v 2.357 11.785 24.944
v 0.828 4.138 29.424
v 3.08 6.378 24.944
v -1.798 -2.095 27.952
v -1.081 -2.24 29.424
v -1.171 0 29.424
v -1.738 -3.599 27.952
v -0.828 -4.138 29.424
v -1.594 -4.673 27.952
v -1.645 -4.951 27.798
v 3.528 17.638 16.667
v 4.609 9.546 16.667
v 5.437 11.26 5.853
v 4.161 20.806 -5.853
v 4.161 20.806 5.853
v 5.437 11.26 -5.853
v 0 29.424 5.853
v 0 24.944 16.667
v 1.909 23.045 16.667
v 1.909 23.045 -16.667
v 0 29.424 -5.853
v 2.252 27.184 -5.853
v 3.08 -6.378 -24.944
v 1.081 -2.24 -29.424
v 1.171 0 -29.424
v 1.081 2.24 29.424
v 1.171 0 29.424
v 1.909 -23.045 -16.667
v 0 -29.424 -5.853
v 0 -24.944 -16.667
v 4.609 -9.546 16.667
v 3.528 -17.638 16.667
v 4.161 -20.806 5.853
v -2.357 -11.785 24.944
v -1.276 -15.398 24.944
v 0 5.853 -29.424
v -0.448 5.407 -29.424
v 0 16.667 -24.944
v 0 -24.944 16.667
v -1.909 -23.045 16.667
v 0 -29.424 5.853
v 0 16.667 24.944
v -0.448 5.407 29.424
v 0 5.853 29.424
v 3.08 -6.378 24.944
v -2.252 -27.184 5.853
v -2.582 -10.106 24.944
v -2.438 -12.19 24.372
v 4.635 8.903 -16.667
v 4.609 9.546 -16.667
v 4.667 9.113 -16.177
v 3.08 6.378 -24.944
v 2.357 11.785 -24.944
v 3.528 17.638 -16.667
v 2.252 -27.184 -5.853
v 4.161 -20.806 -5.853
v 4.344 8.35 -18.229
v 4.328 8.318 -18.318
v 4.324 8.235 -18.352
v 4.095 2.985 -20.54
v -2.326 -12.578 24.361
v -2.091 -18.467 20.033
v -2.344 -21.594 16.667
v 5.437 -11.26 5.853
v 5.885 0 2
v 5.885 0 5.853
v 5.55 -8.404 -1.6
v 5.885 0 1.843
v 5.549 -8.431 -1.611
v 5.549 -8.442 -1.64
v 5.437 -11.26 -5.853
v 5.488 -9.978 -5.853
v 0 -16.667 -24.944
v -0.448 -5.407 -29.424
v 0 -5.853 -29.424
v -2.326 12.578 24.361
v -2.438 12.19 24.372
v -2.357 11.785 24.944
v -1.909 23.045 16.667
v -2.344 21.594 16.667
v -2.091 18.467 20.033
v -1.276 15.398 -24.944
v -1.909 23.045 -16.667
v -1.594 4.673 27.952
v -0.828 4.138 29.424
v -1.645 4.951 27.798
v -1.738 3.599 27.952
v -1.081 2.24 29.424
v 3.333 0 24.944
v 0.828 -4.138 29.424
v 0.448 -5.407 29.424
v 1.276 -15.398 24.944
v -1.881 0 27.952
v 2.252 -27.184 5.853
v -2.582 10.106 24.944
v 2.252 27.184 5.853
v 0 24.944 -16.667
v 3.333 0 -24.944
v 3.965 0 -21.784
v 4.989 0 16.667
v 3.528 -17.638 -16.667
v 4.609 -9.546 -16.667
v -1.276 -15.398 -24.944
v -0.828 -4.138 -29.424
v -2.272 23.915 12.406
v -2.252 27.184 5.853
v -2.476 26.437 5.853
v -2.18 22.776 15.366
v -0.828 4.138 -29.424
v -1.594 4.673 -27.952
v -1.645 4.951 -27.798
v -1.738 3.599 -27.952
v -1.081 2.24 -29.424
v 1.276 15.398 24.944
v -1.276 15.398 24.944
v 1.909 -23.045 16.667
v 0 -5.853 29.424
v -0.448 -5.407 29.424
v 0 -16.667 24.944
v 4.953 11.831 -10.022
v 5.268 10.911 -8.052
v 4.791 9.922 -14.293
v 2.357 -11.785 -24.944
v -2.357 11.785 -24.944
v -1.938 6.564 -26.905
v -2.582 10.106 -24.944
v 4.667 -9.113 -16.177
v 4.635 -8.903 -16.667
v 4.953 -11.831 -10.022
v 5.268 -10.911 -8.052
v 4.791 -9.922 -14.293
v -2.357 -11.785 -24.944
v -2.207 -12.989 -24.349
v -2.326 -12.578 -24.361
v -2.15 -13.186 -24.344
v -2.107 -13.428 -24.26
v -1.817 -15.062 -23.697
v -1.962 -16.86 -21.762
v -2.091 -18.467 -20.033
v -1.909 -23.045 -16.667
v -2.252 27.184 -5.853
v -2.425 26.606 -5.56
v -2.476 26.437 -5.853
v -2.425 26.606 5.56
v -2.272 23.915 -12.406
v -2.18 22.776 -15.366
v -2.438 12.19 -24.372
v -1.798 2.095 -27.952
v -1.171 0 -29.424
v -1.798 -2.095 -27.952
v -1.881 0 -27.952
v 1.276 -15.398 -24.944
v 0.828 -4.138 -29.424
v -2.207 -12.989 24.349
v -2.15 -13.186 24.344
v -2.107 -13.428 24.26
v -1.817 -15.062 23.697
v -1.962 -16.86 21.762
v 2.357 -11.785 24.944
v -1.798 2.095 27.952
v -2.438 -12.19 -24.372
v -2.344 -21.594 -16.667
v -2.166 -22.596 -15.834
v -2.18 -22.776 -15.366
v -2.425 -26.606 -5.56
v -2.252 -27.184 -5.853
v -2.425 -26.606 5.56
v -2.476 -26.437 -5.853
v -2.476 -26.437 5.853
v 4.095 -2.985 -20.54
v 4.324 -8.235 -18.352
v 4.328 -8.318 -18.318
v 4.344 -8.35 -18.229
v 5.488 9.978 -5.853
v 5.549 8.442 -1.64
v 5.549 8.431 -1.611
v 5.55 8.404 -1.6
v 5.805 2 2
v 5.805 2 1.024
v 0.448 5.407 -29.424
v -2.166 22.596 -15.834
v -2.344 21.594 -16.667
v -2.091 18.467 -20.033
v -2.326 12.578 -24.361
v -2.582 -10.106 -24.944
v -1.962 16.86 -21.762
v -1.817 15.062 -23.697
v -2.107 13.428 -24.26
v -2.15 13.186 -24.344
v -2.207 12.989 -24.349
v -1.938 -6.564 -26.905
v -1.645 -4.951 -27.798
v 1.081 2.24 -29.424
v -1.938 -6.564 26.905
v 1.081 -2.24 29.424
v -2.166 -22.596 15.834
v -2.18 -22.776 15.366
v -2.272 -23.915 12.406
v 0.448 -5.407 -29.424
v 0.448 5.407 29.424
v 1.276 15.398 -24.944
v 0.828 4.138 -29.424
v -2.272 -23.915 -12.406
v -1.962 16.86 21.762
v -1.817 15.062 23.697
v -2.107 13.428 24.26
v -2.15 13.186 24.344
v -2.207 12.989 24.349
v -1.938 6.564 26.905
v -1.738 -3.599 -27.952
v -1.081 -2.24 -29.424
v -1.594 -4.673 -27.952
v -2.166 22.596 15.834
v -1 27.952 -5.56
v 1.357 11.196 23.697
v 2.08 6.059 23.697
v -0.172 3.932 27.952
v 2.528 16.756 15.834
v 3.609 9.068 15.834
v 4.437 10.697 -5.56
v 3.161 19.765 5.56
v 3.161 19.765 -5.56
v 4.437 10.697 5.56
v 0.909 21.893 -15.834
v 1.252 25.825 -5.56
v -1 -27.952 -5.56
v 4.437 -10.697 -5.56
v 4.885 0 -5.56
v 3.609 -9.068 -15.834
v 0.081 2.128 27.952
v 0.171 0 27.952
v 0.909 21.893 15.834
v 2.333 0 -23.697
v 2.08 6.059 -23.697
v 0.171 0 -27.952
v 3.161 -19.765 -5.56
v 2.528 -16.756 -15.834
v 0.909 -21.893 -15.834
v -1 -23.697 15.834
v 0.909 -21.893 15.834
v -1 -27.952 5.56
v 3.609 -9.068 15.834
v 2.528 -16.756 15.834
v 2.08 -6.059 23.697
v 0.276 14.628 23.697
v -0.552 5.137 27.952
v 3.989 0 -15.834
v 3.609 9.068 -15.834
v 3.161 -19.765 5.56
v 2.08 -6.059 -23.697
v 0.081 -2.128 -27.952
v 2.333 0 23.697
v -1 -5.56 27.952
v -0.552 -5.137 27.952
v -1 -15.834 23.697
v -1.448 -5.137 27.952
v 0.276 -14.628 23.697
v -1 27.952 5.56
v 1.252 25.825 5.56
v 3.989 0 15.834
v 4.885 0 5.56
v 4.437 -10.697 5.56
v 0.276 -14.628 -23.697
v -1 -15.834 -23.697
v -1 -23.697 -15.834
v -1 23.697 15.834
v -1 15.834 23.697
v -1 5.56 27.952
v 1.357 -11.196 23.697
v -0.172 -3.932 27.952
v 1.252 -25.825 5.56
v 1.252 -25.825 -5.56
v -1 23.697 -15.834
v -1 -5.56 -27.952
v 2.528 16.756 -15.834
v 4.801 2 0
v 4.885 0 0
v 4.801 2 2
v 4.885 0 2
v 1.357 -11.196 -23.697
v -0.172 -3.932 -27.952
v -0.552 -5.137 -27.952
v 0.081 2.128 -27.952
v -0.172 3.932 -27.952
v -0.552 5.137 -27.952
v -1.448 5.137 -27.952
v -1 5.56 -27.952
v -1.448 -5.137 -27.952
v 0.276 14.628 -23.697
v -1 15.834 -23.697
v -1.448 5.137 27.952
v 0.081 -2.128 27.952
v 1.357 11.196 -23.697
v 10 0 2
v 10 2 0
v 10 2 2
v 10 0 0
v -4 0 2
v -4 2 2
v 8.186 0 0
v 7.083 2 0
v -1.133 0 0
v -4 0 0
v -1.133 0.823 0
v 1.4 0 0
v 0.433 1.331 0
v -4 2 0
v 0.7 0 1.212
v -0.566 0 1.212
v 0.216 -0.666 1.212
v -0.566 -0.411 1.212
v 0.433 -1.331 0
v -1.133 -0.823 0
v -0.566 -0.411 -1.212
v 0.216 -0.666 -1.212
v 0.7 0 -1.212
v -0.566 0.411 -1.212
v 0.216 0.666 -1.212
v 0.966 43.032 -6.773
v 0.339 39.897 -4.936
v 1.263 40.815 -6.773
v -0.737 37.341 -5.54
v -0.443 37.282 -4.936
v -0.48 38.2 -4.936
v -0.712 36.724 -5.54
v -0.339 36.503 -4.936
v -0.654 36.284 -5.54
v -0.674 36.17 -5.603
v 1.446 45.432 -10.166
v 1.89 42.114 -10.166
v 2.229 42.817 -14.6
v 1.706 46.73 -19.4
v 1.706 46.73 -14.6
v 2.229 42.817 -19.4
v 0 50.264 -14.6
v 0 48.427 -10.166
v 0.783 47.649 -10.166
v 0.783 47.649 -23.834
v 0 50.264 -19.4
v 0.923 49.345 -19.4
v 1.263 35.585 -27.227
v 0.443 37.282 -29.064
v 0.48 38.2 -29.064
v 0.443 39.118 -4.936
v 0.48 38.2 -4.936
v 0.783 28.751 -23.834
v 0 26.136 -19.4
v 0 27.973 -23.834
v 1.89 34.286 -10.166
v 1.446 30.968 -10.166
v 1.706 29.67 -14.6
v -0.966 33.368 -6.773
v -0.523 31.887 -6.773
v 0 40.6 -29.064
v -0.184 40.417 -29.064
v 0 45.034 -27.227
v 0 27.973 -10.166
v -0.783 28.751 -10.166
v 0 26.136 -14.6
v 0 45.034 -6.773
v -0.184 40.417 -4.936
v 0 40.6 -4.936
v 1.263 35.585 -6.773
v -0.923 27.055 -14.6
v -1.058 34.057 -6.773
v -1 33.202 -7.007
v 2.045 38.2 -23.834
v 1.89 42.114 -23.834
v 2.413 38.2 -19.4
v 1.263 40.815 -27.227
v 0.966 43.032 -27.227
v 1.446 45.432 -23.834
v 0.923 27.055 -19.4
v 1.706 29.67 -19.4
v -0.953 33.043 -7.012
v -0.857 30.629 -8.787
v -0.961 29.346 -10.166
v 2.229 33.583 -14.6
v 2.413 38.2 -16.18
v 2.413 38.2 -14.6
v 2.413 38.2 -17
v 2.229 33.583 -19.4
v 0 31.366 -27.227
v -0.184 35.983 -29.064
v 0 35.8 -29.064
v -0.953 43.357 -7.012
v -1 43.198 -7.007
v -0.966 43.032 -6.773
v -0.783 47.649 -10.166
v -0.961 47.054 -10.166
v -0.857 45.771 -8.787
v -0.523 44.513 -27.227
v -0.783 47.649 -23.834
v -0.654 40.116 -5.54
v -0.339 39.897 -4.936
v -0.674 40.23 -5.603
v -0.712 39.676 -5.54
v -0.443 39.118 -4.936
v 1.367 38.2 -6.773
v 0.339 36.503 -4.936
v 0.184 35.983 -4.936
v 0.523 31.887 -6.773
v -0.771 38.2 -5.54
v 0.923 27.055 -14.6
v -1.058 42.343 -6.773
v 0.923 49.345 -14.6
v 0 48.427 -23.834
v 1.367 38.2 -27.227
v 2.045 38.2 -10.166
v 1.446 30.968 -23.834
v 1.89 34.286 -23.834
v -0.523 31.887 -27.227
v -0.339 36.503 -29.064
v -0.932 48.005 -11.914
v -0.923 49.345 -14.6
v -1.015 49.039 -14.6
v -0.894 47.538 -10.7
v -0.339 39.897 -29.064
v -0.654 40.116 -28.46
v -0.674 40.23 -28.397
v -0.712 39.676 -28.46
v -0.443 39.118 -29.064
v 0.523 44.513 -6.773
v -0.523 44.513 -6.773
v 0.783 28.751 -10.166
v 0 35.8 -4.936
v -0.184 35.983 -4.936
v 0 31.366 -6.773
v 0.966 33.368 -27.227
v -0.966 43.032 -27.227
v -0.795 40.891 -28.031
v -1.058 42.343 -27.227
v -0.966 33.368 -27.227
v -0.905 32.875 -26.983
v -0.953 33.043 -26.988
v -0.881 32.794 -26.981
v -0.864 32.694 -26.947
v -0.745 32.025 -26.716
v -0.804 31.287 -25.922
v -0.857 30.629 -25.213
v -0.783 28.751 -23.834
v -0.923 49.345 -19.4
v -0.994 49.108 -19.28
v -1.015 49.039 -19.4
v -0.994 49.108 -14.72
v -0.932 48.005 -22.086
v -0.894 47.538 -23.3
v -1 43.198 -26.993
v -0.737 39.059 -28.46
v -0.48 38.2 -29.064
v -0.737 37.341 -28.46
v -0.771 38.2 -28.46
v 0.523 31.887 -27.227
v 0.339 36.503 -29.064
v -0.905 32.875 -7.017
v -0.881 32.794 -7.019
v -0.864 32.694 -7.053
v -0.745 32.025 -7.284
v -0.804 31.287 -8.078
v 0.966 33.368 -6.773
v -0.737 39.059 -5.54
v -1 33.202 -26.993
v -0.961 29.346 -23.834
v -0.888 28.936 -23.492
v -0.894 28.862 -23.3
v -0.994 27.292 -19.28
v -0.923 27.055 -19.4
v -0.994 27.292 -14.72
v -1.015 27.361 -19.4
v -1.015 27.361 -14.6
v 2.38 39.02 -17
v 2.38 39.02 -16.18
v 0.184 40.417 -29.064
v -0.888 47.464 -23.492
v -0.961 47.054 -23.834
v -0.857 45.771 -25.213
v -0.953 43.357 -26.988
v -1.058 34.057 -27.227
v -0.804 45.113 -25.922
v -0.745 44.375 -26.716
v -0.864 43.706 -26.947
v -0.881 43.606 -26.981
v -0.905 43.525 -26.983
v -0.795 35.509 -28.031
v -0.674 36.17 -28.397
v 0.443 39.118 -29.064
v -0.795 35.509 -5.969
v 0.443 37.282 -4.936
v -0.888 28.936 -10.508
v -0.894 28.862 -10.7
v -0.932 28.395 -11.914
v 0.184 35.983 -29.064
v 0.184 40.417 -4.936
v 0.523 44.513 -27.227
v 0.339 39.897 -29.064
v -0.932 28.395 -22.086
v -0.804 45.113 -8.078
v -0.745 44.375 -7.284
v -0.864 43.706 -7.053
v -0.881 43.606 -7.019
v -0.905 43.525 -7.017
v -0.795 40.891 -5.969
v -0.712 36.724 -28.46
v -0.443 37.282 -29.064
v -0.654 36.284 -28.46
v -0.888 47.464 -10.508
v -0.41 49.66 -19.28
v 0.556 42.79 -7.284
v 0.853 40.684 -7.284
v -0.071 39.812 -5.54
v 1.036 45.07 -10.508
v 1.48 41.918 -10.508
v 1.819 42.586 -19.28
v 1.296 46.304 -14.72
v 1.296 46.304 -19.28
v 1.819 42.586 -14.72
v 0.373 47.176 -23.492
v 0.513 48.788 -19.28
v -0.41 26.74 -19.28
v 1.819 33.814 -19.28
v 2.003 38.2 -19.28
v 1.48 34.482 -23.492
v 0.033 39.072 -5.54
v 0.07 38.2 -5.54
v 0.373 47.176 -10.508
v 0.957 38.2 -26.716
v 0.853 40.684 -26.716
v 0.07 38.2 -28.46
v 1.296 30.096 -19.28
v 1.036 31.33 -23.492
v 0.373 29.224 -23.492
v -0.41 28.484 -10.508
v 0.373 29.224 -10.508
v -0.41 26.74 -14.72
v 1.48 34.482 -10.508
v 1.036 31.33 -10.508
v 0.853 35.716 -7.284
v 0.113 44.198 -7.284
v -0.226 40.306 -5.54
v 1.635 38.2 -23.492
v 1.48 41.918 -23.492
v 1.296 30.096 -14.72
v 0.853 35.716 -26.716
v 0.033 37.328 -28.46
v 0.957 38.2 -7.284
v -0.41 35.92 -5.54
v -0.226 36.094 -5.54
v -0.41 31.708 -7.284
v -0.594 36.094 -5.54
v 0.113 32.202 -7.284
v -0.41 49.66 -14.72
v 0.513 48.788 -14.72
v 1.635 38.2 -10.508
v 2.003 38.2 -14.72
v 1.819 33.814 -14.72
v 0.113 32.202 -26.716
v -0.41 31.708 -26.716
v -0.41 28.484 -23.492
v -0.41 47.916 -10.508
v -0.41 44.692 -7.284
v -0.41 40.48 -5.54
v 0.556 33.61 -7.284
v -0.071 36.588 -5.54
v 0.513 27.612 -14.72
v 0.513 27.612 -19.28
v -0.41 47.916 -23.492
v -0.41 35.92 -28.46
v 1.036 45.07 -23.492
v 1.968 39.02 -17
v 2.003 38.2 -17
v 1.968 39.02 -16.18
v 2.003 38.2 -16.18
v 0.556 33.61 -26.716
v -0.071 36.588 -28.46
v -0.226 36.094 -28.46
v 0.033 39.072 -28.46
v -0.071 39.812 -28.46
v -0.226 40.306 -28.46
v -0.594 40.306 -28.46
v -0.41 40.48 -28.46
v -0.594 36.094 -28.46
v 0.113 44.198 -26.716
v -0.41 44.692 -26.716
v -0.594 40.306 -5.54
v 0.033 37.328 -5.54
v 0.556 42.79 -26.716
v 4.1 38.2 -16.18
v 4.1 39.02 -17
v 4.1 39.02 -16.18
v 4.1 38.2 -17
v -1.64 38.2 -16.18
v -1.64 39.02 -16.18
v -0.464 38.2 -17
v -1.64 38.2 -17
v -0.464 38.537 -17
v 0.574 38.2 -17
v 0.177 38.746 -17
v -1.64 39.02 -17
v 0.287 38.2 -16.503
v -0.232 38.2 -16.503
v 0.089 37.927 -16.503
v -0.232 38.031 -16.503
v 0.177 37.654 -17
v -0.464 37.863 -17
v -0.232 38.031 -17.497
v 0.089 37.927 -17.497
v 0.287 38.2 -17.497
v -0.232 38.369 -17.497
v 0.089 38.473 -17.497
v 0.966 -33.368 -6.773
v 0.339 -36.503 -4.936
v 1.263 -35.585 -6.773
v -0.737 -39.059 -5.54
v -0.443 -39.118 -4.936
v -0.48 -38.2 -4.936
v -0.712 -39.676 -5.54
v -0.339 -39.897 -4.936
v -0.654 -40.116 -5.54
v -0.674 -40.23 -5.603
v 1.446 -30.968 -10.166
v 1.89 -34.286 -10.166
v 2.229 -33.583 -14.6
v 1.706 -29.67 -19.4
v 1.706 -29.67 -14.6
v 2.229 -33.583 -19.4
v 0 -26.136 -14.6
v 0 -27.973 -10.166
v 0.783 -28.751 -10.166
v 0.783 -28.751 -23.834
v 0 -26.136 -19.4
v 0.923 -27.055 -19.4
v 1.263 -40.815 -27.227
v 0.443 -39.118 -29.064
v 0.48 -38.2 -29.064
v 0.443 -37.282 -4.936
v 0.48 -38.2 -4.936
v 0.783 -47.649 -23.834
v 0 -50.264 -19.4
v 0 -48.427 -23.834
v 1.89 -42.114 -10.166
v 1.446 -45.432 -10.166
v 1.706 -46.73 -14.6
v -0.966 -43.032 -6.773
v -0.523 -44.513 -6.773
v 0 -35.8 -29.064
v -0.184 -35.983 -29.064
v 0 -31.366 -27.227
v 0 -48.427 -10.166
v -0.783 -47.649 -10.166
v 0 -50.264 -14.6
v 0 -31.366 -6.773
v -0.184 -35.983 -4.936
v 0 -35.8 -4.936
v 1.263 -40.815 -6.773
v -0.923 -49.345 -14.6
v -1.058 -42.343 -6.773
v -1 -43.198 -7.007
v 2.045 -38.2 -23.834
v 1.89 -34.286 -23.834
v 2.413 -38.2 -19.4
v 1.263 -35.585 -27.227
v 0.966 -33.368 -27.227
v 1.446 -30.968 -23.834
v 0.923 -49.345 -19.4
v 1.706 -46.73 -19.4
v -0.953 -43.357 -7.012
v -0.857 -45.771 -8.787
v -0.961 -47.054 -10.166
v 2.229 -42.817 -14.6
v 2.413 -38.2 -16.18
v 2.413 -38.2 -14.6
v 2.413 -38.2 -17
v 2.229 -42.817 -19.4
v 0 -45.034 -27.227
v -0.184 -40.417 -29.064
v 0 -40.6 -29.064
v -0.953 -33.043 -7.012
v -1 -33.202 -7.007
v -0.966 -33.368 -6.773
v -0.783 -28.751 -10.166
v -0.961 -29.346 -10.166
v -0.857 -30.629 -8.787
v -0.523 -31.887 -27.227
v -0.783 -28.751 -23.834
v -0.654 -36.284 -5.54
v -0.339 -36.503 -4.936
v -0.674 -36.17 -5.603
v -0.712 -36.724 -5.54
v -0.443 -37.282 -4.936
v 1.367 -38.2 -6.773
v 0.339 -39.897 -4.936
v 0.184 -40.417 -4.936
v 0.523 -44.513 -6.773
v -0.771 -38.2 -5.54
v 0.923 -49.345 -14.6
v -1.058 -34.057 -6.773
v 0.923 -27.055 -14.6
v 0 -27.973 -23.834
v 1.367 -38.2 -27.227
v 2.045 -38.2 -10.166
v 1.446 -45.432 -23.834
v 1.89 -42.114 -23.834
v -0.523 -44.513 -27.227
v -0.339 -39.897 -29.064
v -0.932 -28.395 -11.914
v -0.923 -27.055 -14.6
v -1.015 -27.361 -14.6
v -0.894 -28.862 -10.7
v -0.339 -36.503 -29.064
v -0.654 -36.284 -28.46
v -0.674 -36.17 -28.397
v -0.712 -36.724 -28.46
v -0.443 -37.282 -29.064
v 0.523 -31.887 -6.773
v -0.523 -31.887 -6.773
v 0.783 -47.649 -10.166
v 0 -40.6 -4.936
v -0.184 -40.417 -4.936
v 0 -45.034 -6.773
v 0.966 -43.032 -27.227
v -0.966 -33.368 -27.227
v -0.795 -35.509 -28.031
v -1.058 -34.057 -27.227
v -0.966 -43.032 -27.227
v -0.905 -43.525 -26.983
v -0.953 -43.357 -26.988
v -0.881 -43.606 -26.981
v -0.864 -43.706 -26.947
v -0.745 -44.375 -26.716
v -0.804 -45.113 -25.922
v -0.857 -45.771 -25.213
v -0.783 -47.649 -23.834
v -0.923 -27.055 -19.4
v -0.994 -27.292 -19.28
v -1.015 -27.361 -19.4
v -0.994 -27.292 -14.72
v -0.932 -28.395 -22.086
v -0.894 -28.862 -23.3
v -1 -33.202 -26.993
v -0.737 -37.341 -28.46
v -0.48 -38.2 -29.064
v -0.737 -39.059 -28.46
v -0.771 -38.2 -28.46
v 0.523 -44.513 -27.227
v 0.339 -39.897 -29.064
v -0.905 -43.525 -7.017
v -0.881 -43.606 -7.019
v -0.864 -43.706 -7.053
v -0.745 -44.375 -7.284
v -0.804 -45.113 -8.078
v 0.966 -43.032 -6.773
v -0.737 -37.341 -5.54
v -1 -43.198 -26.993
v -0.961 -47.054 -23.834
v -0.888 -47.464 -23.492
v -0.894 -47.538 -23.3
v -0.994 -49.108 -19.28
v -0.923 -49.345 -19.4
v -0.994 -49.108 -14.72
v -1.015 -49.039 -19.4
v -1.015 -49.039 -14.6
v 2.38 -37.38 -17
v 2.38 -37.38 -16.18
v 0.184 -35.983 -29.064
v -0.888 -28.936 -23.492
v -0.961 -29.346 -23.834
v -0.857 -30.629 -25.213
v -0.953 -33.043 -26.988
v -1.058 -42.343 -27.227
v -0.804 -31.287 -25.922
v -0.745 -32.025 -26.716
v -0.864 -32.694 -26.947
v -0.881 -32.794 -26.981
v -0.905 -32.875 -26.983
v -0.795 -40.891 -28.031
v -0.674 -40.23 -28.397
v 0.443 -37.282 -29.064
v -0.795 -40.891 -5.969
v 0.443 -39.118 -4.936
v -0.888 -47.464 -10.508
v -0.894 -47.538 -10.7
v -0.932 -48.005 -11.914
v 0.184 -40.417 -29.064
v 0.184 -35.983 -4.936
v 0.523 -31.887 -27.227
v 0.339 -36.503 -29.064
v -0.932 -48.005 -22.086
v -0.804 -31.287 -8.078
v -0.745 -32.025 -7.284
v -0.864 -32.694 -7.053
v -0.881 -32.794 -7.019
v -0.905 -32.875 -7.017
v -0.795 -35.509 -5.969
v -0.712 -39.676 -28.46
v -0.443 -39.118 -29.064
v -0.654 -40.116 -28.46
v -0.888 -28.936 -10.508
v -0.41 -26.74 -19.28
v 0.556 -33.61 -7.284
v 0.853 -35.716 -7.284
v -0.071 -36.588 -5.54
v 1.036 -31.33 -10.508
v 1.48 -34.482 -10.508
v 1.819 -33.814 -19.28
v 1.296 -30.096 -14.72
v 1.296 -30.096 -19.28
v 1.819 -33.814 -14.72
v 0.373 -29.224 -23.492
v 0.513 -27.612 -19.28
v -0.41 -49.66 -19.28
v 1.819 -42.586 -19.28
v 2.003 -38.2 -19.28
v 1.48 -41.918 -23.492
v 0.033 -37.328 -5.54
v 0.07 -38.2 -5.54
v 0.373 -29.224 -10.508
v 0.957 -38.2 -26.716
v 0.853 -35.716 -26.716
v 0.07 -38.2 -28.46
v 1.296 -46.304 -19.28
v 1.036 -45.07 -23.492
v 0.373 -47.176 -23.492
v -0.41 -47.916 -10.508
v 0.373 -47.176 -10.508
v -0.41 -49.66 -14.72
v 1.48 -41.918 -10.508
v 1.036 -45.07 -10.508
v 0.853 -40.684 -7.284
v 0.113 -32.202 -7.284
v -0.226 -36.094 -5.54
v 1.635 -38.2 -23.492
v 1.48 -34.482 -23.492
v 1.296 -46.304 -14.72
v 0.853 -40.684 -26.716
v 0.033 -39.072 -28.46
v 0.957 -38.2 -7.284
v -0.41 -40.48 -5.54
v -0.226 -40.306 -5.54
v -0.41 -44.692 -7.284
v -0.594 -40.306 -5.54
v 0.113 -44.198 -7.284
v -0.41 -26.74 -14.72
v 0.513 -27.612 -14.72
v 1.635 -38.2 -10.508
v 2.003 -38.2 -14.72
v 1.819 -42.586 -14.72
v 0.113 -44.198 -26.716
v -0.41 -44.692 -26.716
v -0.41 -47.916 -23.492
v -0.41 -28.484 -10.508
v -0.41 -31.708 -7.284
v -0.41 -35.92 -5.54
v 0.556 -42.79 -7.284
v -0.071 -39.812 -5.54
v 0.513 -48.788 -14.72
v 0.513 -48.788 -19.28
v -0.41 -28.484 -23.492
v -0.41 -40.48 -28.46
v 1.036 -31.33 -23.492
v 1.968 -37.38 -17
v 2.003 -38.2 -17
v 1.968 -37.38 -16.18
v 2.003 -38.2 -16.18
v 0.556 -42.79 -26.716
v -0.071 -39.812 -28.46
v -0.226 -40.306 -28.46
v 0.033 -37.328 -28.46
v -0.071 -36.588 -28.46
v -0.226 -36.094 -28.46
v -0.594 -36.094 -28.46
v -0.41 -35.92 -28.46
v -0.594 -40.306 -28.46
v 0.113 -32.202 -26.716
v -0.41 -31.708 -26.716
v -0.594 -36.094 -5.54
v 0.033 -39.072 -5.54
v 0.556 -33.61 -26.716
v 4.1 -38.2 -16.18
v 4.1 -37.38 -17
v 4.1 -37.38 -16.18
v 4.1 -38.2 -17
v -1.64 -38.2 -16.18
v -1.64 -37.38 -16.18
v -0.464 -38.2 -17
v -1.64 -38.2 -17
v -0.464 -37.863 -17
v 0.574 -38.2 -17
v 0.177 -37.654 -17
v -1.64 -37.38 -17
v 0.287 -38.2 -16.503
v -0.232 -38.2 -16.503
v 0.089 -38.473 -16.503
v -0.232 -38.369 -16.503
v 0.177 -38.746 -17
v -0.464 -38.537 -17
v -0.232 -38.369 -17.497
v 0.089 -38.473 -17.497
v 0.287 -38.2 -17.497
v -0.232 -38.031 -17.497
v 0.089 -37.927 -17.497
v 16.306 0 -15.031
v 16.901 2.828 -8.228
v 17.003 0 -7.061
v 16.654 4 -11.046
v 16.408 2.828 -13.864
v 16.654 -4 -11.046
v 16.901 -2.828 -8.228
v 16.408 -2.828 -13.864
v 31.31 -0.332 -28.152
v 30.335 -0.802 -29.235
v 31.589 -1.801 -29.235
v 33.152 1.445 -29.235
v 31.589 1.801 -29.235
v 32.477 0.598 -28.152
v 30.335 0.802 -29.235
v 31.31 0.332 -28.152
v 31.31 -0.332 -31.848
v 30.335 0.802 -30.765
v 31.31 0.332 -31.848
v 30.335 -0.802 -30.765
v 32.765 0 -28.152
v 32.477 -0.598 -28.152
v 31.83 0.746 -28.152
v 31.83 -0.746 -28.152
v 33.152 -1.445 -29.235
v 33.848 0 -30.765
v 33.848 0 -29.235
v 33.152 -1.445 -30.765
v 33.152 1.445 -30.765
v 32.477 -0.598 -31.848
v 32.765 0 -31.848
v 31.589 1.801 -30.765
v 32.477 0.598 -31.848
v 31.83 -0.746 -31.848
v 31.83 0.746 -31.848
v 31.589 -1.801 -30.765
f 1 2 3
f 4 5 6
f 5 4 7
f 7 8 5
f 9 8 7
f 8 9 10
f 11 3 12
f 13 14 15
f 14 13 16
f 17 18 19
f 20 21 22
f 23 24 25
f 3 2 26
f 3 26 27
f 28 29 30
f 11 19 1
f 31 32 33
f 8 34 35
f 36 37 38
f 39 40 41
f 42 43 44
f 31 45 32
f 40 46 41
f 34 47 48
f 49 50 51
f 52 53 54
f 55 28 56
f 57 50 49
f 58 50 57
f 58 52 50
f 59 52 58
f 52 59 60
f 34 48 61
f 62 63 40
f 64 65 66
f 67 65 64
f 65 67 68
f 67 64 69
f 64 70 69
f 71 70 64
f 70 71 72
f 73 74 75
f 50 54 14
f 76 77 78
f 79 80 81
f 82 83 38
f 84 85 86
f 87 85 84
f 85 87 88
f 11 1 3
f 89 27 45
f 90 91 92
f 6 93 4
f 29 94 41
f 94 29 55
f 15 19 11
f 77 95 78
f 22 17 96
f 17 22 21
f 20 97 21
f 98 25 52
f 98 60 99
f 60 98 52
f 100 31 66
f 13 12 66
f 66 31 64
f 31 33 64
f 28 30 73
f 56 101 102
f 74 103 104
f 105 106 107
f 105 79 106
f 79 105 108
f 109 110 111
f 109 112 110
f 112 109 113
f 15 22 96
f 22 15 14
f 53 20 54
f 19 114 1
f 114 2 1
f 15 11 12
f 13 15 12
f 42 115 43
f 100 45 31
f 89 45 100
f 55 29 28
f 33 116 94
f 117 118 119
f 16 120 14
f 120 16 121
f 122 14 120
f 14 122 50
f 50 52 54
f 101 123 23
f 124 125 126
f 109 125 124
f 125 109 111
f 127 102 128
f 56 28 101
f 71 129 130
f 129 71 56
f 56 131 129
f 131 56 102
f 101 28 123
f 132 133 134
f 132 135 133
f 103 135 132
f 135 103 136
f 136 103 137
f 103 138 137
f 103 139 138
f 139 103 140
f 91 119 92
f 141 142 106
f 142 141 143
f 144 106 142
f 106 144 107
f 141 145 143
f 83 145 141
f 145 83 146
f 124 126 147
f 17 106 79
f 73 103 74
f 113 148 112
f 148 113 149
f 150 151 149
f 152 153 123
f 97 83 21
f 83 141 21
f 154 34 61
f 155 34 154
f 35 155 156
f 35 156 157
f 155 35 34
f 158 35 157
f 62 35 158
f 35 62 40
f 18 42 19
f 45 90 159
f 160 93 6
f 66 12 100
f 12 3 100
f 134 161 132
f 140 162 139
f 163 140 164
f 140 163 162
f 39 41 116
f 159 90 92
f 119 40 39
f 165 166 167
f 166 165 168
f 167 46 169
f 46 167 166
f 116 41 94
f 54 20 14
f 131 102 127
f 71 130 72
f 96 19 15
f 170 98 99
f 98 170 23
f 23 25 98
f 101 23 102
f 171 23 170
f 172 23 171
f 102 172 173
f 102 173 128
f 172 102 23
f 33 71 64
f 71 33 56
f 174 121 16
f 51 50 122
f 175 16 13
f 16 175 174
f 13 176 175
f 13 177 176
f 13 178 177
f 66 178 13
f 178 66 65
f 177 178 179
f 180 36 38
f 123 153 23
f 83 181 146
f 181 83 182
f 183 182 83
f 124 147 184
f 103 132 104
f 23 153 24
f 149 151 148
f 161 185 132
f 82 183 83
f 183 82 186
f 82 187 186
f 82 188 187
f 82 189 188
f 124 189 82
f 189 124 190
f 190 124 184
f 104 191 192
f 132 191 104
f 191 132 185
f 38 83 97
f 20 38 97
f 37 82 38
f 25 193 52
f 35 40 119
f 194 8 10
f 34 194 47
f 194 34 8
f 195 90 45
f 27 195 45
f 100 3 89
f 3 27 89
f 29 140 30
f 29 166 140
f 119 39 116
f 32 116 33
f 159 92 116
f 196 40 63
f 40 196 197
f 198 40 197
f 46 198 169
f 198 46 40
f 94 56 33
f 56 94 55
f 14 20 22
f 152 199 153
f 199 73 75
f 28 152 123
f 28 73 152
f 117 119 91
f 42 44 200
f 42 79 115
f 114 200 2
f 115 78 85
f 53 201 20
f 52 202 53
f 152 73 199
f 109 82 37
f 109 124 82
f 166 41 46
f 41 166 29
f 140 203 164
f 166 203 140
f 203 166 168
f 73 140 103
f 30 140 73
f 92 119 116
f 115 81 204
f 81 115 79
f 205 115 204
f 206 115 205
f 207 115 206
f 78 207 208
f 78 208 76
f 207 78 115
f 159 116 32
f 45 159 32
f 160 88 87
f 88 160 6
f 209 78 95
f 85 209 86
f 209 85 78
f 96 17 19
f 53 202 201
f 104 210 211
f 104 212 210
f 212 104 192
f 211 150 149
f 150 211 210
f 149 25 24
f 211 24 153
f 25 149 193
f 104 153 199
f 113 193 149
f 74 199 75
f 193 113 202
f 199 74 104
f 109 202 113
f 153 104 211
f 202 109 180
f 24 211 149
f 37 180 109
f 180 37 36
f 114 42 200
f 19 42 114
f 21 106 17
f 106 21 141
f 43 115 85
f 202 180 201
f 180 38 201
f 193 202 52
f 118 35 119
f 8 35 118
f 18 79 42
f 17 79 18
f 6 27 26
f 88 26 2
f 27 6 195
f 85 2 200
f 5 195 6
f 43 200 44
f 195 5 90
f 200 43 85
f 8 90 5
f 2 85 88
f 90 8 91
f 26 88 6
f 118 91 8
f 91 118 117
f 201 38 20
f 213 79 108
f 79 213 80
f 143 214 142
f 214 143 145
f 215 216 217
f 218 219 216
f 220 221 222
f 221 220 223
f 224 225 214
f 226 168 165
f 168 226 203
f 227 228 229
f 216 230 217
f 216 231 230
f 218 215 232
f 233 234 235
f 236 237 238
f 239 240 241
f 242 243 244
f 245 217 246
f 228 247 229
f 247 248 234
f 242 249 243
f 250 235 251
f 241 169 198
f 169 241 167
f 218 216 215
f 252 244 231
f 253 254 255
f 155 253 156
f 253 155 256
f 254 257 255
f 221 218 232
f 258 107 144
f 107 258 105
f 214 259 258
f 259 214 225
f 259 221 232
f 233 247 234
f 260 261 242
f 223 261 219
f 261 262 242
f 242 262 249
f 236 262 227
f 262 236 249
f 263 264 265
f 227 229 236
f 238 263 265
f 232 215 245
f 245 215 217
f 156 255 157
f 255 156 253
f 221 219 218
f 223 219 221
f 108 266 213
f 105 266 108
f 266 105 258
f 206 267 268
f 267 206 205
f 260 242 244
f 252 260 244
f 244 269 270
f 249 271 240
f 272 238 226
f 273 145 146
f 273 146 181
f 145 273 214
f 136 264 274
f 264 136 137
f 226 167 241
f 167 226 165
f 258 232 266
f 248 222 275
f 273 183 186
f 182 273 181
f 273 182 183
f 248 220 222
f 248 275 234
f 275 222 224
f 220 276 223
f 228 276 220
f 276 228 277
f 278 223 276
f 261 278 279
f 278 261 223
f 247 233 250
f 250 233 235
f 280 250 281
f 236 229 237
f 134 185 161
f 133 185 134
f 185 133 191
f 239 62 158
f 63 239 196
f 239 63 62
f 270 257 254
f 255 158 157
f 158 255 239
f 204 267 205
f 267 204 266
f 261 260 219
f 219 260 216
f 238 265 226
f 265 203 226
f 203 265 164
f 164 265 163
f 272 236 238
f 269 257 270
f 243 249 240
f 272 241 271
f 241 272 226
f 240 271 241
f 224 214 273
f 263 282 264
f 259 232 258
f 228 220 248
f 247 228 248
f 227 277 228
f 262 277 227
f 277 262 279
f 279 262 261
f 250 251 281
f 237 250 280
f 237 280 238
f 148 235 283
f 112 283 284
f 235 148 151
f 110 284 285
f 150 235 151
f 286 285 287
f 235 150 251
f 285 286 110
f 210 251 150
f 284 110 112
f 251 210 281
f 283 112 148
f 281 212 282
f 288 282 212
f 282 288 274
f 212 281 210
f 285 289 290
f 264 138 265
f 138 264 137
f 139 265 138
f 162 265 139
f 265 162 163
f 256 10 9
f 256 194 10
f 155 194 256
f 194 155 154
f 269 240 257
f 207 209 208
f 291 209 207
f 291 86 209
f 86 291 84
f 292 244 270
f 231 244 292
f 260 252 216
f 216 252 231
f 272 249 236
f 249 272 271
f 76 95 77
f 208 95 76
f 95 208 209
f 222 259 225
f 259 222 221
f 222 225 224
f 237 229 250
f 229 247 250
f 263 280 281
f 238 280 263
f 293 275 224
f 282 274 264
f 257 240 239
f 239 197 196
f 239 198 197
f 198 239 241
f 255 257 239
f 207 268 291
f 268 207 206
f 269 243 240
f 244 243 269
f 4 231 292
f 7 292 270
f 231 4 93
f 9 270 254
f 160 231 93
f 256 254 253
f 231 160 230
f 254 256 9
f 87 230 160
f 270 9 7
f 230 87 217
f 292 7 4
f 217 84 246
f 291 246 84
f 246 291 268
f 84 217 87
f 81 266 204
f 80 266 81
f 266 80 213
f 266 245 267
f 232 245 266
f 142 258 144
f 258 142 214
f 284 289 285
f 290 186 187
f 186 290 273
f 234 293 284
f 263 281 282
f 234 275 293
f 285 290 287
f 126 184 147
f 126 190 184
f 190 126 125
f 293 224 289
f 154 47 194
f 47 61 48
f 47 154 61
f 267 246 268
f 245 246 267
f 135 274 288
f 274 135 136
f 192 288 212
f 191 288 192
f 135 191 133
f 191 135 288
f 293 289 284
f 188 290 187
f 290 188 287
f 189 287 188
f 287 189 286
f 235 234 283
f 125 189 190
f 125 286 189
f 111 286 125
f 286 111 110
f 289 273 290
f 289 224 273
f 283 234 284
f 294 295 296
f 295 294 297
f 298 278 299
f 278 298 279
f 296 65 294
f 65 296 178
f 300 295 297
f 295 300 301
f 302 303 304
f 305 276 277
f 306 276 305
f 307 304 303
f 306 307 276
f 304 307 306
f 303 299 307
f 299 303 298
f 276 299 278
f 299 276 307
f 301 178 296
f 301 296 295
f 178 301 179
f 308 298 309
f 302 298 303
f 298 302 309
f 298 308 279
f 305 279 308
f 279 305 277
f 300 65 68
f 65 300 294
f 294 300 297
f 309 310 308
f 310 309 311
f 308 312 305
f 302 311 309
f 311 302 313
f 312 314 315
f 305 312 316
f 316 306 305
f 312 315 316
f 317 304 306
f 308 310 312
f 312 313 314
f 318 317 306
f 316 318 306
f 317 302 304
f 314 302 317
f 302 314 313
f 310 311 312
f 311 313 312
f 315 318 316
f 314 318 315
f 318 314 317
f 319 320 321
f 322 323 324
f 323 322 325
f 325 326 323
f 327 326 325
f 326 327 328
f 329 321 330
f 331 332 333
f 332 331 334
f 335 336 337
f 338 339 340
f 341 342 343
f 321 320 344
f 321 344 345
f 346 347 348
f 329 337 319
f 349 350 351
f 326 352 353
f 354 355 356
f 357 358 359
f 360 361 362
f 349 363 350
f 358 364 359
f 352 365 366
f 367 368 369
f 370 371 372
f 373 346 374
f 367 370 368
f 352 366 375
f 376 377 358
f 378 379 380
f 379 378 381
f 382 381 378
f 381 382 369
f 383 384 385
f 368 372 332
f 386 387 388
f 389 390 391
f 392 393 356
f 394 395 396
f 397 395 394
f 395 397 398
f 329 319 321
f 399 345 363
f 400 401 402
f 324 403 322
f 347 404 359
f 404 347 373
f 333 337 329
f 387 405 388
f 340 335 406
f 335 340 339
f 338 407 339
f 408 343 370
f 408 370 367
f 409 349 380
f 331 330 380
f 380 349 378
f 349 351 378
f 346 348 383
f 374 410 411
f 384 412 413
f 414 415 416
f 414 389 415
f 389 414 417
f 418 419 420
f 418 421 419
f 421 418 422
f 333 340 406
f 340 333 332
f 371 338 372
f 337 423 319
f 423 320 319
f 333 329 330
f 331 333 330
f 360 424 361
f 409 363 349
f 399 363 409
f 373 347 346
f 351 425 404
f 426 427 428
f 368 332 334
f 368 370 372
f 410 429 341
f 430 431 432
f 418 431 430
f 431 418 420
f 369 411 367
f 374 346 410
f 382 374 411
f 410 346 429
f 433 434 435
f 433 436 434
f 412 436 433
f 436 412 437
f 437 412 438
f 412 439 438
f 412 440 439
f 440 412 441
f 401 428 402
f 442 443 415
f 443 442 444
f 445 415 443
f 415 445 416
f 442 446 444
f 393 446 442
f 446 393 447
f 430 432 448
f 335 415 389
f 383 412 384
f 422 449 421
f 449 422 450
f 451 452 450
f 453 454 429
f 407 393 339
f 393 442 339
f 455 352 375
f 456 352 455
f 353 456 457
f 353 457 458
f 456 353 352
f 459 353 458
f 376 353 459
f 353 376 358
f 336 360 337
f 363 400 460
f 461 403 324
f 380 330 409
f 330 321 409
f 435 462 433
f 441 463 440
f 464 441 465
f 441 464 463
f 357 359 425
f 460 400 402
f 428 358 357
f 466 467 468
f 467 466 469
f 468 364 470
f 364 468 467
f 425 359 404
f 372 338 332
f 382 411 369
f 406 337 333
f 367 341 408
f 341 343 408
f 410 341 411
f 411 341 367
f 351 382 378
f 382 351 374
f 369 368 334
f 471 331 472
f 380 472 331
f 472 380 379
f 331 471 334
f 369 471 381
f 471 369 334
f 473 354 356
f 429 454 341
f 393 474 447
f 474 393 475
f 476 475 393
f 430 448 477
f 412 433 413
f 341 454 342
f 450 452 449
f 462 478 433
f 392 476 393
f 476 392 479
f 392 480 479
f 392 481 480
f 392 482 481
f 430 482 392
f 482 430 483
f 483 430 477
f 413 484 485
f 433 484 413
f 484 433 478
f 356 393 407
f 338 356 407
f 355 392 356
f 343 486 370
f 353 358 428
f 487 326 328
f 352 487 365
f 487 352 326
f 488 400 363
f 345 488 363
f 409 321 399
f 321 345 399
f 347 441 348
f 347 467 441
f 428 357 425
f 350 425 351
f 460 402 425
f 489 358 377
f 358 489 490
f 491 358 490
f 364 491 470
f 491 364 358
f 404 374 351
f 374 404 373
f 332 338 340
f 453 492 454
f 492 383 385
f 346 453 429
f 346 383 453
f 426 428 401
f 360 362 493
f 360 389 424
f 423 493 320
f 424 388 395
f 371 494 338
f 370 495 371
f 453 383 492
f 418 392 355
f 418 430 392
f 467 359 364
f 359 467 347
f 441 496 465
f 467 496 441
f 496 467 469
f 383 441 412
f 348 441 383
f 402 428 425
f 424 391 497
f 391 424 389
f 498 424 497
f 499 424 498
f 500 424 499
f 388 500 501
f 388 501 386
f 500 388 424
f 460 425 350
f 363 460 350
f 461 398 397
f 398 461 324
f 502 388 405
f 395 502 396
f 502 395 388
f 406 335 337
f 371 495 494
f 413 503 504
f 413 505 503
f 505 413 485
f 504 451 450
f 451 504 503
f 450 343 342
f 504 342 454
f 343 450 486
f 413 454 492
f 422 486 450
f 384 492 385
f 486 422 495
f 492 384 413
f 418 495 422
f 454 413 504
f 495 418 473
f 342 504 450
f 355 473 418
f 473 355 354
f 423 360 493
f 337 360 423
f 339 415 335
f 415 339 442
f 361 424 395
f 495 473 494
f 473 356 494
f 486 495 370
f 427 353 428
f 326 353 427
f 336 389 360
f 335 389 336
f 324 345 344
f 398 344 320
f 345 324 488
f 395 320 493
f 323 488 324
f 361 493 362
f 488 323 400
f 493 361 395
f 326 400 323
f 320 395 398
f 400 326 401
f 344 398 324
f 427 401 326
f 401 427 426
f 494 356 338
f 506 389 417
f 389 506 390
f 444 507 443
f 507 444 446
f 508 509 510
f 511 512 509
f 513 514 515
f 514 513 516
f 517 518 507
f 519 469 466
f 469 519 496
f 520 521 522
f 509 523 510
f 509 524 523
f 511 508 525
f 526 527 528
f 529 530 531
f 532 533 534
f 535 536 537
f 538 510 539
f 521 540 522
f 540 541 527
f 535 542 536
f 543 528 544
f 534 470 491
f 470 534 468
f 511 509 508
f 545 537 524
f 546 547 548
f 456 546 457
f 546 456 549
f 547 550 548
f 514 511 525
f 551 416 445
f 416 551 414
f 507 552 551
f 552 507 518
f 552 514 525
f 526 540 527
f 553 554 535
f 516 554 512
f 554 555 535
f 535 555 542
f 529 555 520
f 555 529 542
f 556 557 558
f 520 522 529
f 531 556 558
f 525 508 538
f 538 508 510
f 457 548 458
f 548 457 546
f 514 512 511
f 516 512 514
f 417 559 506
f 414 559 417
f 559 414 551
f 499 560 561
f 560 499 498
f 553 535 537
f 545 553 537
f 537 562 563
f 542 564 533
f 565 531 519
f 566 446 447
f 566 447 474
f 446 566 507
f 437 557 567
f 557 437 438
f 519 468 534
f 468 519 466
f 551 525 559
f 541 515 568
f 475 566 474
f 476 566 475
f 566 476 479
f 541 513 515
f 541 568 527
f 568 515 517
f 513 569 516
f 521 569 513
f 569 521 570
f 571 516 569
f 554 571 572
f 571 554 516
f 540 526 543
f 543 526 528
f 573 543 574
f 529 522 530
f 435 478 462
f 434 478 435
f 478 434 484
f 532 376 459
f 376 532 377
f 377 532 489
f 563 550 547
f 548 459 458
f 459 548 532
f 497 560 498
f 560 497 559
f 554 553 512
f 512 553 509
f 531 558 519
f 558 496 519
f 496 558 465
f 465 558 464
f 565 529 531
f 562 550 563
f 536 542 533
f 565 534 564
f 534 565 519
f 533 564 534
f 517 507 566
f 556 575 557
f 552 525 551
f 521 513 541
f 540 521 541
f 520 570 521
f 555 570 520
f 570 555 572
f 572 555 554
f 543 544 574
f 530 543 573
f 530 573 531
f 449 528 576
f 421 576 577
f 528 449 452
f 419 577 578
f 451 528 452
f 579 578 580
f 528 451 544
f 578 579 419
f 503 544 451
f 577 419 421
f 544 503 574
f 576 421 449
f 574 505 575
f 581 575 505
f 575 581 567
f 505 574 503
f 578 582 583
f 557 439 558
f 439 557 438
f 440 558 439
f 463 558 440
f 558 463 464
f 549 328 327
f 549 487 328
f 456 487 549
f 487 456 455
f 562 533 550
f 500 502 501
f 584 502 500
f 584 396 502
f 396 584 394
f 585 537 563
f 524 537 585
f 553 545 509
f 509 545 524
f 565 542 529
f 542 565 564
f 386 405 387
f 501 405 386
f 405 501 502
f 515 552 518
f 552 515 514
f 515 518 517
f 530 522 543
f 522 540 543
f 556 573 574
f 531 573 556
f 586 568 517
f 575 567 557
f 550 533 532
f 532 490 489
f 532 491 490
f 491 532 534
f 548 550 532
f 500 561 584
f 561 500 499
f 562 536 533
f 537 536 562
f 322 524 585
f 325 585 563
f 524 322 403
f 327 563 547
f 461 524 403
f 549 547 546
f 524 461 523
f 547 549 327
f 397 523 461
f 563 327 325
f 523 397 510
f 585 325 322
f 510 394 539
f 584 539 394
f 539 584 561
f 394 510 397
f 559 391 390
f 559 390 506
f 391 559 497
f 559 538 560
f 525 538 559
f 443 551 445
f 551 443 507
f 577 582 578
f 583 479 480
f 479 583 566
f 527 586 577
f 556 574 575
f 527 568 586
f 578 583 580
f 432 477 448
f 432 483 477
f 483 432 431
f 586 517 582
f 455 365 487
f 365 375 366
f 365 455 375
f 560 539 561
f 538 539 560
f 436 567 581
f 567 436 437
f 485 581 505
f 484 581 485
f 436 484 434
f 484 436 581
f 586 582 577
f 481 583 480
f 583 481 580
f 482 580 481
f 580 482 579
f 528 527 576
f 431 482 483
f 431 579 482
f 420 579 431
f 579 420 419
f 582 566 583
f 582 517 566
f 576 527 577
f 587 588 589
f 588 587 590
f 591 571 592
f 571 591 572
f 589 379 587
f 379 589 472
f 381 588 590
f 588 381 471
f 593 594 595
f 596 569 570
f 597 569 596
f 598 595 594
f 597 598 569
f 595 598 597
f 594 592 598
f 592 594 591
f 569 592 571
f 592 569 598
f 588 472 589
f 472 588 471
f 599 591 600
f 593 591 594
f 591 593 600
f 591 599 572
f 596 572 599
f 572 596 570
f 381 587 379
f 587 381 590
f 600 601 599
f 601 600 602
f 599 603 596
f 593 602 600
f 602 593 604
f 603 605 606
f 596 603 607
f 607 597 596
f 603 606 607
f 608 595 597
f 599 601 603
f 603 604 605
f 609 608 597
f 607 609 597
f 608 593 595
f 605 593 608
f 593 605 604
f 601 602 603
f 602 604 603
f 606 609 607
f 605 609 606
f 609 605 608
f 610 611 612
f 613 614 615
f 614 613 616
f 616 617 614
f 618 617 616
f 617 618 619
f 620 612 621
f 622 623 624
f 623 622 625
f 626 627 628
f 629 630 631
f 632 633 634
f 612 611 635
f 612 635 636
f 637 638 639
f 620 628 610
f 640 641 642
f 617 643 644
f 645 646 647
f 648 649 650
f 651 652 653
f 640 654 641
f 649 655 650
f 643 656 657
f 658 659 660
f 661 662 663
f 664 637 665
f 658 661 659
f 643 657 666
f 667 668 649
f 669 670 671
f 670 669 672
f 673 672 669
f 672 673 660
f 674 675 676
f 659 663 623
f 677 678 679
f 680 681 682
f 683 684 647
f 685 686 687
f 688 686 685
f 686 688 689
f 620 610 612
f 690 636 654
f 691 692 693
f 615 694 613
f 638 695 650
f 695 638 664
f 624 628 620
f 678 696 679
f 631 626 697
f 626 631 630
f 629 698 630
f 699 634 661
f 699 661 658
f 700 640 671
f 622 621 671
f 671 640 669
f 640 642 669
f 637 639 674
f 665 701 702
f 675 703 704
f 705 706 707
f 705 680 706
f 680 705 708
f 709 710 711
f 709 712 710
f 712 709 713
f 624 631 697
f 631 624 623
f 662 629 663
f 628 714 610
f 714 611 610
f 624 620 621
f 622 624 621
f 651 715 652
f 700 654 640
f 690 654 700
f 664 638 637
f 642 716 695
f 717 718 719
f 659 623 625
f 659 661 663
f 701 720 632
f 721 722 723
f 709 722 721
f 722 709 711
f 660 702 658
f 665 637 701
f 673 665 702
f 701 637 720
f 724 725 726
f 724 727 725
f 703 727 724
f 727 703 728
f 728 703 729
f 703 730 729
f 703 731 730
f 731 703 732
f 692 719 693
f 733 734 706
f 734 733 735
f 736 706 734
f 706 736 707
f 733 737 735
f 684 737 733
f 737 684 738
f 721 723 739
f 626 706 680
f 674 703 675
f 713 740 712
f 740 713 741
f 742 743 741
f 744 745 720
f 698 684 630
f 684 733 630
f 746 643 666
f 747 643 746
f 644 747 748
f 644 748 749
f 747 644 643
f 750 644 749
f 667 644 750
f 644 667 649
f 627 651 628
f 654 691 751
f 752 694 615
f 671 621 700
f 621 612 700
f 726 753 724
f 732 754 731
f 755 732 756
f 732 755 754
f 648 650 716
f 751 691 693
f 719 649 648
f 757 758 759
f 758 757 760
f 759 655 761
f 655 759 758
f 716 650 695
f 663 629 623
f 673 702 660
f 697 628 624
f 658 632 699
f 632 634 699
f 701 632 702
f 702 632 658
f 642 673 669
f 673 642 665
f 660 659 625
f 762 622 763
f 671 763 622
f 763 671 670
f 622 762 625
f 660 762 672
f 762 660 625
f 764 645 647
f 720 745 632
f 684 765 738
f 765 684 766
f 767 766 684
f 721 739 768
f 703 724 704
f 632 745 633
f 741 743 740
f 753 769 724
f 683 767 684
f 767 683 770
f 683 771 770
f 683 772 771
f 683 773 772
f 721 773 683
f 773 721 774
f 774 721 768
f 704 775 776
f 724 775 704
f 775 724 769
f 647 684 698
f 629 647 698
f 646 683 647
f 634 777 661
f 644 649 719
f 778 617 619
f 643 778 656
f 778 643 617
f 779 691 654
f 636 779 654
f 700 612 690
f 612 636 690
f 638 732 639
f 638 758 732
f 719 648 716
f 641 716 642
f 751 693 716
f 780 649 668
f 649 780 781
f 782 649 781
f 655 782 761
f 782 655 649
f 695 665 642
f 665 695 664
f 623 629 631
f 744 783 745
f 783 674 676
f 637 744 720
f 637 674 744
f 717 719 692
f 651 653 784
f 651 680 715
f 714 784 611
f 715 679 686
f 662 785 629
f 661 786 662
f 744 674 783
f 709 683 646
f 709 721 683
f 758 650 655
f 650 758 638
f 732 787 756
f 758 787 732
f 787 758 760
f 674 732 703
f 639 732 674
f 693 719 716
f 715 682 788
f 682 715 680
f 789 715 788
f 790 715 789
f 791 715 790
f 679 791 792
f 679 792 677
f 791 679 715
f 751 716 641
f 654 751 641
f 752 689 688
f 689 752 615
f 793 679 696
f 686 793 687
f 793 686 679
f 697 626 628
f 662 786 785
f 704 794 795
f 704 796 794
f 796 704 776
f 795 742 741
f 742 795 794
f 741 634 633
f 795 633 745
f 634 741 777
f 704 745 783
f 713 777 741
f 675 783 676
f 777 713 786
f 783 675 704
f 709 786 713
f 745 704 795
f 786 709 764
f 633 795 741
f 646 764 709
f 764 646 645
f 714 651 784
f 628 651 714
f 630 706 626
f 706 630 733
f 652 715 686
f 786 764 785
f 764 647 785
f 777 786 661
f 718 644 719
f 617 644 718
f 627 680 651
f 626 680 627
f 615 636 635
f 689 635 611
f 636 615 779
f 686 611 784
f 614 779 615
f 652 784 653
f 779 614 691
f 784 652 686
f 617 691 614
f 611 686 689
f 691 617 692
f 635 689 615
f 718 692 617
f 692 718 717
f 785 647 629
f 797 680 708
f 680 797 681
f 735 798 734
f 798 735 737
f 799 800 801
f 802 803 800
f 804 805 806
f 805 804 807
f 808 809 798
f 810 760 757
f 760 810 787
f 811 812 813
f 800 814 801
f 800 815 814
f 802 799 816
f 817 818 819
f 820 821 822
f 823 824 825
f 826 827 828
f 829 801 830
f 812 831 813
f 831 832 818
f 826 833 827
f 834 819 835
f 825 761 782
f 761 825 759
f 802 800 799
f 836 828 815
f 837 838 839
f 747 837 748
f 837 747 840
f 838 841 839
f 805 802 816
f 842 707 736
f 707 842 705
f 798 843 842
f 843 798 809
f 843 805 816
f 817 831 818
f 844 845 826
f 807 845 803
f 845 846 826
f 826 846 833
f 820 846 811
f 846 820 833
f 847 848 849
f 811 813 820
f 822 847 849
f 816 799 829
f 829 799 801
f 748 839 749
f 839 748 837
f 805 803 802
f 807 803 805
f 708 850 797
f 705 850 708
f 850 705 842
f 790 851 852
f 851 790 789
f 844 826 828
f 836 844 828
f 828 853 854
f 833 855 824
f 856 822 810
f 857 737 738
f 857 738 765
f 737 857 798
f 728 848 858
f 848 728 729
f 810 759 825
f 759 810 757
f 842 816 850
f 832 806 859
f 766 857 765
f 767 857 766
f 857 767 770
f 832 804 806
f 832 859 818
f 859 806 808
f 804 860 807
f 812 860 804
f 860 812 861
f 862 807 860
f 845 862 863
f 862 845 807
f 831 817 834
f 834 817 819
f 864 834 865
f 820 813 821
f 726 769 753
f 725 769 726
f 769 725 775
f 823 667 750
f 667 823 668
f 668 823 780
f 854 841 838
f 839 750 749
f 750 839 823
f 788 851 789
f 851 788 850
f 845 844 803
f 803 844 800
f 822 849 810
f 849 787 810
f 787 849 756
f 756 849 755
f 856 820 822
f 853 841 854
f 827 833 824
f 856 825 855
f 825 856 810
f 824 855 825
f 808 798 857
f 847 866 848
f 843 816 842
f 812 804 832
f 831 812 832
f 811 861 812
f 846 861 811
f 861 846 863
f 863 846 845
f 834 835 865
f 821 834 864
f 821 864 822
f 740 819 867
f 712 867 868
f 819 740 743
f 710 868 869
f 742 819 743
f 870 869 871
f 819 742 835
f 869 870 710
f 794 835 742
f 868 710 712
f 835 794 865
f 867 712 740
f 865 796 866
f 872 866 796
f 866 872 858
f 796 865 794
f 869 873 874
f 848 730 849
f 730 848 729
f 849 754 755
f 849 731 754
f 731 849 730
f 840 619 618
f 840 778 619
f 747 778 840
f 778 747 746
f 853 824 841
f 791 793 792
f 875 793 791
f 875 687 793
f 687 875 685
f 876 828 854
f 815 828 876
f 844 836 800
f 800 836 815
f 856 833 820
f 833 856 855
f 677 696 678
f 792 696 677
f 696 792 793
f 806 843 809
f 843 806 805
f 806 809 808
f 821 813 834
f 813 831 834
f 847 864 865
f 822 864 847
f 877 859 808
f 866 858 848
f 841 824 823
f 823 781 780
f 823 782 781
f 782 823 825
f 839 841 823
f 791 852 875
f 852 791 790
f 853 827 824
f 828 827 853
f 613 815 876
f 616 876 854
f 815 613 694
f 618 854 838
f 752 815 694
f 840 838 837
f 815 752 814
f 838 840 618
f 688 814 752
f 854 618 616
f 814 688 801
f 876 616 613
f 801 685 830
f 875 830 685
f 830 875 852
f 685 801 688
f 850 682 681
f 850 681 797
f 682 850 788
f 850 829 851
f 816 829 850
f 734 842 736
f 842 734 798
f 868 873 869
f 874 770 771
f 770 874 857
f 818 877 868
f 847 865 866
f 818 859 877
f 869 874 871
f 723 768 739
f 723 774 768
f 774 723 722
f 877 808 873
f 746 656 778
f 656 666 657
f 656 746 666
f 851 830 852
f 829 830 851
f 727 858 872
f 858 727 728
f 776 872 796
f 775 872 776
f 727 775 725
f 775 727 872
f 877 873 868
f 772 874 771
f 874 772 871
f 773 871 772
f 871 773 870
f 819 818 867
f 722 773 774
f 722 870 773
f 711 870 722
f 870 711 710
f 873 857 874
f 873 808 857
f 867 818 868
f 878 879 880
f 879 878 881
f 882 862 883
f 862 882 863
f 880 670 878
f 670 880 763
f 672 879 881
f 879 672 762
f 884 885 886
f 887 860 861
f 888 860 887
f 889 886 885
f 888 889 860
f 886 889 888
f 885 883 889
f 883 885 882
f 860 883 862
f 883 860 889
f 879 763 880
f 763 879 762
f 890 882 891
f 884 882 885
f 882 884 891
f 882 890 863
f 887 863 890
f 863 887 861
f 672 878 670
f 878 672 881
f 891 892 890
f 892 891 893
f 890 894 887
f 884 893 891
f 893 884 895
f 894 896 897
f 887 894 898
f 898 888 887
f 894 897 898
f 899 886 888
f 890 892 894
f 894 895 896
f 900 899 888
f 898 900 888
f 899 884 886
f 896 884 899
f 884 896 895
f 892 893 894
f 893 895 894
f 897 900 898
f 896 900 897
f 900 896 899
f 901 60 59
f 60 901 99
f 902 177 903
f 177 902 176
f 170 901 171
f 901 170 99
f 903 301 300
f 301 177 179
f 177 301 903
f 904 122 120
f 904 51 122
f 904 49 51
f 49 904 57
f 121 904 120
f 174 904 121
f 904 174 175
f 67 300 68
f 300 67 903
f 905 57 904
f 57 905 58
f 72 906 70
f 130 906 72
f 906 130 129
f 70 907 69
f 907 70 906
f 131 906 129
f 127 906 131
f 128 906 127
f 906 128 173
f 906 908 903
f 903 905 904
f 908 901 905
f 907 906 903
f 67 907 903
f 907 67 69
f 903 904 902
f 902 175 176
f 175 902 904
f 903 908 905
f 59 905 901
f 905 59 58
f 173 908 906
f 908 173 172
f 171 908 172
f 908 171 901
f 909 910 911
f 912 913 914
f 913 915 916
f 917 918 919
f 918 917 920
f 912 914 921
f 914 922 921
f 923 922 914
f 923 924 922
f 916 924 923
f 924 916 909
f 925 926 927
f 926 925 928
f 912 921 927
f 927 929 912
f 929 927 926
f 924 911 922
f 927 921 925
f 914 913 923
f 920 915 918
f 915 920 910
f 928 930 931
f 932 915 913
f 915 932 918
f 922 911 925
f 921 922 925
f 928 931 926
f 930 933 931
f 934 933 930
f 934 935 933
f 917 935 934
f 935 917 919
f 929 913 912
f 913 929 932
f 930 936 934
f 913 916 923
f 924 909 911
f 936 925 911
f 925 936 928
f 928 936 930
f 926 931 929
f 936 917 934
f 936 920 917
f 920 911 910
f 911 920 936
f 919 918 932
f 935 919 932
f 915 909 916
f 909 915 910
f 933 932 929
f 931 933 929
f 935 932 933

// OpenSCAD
module trucPlat() {
    scale([0.2, 1, 1])
        sphere(r = 30, $fn = 16);  // corregido ":" por ";"
}

module parabole() {
    union() {
        translate([-4, 0, 0])
            cube([14, 2, 2]);  // corregido: cube([-14,0,0]) inválido → ejemplo con tamaño válido

        sphere(r = 1.4, center = true, $fn = 5);

        difference() {
            trucPlat();

            scale([1, 0.95, 0.95])
                translate([-1, 0, 0])
                    trucPlat();

            translate([-60, 0, 0])
                cube([120, 30, 30], center = true);  // cube(30*4) → debe tener vector
        }
    }
}

parabole();

translate([0, 38.2, -17])
    scale(0.41)
        parabole();

translate([0, -38.2, -17])
    scale(0.41)
        parabole();

translate([0, 38.2, -17])
    scale(0.41)
        parabole();

translate([1.2, 0, -17])
    scale([0.4, 1, 1])
        difference() {
            rotate_extrude(/* angle = 60 */ convexity = 10, $fn = 7)
                circle(3);
            cube([90, 10, 10], center = true);  // corregido: cube(90) → vector requerido en difference()
        }

translate([4.7, 0, -10])
    rotate([0, 95, 0])
        cylinder(h = 12, r1 = 12, r2 = 4, $fn = 8);

translate([16, 0, -15])  
        translate([16, 0, -15])
    sphere(r = 2);  // o cualquier otra figura que estés usando
